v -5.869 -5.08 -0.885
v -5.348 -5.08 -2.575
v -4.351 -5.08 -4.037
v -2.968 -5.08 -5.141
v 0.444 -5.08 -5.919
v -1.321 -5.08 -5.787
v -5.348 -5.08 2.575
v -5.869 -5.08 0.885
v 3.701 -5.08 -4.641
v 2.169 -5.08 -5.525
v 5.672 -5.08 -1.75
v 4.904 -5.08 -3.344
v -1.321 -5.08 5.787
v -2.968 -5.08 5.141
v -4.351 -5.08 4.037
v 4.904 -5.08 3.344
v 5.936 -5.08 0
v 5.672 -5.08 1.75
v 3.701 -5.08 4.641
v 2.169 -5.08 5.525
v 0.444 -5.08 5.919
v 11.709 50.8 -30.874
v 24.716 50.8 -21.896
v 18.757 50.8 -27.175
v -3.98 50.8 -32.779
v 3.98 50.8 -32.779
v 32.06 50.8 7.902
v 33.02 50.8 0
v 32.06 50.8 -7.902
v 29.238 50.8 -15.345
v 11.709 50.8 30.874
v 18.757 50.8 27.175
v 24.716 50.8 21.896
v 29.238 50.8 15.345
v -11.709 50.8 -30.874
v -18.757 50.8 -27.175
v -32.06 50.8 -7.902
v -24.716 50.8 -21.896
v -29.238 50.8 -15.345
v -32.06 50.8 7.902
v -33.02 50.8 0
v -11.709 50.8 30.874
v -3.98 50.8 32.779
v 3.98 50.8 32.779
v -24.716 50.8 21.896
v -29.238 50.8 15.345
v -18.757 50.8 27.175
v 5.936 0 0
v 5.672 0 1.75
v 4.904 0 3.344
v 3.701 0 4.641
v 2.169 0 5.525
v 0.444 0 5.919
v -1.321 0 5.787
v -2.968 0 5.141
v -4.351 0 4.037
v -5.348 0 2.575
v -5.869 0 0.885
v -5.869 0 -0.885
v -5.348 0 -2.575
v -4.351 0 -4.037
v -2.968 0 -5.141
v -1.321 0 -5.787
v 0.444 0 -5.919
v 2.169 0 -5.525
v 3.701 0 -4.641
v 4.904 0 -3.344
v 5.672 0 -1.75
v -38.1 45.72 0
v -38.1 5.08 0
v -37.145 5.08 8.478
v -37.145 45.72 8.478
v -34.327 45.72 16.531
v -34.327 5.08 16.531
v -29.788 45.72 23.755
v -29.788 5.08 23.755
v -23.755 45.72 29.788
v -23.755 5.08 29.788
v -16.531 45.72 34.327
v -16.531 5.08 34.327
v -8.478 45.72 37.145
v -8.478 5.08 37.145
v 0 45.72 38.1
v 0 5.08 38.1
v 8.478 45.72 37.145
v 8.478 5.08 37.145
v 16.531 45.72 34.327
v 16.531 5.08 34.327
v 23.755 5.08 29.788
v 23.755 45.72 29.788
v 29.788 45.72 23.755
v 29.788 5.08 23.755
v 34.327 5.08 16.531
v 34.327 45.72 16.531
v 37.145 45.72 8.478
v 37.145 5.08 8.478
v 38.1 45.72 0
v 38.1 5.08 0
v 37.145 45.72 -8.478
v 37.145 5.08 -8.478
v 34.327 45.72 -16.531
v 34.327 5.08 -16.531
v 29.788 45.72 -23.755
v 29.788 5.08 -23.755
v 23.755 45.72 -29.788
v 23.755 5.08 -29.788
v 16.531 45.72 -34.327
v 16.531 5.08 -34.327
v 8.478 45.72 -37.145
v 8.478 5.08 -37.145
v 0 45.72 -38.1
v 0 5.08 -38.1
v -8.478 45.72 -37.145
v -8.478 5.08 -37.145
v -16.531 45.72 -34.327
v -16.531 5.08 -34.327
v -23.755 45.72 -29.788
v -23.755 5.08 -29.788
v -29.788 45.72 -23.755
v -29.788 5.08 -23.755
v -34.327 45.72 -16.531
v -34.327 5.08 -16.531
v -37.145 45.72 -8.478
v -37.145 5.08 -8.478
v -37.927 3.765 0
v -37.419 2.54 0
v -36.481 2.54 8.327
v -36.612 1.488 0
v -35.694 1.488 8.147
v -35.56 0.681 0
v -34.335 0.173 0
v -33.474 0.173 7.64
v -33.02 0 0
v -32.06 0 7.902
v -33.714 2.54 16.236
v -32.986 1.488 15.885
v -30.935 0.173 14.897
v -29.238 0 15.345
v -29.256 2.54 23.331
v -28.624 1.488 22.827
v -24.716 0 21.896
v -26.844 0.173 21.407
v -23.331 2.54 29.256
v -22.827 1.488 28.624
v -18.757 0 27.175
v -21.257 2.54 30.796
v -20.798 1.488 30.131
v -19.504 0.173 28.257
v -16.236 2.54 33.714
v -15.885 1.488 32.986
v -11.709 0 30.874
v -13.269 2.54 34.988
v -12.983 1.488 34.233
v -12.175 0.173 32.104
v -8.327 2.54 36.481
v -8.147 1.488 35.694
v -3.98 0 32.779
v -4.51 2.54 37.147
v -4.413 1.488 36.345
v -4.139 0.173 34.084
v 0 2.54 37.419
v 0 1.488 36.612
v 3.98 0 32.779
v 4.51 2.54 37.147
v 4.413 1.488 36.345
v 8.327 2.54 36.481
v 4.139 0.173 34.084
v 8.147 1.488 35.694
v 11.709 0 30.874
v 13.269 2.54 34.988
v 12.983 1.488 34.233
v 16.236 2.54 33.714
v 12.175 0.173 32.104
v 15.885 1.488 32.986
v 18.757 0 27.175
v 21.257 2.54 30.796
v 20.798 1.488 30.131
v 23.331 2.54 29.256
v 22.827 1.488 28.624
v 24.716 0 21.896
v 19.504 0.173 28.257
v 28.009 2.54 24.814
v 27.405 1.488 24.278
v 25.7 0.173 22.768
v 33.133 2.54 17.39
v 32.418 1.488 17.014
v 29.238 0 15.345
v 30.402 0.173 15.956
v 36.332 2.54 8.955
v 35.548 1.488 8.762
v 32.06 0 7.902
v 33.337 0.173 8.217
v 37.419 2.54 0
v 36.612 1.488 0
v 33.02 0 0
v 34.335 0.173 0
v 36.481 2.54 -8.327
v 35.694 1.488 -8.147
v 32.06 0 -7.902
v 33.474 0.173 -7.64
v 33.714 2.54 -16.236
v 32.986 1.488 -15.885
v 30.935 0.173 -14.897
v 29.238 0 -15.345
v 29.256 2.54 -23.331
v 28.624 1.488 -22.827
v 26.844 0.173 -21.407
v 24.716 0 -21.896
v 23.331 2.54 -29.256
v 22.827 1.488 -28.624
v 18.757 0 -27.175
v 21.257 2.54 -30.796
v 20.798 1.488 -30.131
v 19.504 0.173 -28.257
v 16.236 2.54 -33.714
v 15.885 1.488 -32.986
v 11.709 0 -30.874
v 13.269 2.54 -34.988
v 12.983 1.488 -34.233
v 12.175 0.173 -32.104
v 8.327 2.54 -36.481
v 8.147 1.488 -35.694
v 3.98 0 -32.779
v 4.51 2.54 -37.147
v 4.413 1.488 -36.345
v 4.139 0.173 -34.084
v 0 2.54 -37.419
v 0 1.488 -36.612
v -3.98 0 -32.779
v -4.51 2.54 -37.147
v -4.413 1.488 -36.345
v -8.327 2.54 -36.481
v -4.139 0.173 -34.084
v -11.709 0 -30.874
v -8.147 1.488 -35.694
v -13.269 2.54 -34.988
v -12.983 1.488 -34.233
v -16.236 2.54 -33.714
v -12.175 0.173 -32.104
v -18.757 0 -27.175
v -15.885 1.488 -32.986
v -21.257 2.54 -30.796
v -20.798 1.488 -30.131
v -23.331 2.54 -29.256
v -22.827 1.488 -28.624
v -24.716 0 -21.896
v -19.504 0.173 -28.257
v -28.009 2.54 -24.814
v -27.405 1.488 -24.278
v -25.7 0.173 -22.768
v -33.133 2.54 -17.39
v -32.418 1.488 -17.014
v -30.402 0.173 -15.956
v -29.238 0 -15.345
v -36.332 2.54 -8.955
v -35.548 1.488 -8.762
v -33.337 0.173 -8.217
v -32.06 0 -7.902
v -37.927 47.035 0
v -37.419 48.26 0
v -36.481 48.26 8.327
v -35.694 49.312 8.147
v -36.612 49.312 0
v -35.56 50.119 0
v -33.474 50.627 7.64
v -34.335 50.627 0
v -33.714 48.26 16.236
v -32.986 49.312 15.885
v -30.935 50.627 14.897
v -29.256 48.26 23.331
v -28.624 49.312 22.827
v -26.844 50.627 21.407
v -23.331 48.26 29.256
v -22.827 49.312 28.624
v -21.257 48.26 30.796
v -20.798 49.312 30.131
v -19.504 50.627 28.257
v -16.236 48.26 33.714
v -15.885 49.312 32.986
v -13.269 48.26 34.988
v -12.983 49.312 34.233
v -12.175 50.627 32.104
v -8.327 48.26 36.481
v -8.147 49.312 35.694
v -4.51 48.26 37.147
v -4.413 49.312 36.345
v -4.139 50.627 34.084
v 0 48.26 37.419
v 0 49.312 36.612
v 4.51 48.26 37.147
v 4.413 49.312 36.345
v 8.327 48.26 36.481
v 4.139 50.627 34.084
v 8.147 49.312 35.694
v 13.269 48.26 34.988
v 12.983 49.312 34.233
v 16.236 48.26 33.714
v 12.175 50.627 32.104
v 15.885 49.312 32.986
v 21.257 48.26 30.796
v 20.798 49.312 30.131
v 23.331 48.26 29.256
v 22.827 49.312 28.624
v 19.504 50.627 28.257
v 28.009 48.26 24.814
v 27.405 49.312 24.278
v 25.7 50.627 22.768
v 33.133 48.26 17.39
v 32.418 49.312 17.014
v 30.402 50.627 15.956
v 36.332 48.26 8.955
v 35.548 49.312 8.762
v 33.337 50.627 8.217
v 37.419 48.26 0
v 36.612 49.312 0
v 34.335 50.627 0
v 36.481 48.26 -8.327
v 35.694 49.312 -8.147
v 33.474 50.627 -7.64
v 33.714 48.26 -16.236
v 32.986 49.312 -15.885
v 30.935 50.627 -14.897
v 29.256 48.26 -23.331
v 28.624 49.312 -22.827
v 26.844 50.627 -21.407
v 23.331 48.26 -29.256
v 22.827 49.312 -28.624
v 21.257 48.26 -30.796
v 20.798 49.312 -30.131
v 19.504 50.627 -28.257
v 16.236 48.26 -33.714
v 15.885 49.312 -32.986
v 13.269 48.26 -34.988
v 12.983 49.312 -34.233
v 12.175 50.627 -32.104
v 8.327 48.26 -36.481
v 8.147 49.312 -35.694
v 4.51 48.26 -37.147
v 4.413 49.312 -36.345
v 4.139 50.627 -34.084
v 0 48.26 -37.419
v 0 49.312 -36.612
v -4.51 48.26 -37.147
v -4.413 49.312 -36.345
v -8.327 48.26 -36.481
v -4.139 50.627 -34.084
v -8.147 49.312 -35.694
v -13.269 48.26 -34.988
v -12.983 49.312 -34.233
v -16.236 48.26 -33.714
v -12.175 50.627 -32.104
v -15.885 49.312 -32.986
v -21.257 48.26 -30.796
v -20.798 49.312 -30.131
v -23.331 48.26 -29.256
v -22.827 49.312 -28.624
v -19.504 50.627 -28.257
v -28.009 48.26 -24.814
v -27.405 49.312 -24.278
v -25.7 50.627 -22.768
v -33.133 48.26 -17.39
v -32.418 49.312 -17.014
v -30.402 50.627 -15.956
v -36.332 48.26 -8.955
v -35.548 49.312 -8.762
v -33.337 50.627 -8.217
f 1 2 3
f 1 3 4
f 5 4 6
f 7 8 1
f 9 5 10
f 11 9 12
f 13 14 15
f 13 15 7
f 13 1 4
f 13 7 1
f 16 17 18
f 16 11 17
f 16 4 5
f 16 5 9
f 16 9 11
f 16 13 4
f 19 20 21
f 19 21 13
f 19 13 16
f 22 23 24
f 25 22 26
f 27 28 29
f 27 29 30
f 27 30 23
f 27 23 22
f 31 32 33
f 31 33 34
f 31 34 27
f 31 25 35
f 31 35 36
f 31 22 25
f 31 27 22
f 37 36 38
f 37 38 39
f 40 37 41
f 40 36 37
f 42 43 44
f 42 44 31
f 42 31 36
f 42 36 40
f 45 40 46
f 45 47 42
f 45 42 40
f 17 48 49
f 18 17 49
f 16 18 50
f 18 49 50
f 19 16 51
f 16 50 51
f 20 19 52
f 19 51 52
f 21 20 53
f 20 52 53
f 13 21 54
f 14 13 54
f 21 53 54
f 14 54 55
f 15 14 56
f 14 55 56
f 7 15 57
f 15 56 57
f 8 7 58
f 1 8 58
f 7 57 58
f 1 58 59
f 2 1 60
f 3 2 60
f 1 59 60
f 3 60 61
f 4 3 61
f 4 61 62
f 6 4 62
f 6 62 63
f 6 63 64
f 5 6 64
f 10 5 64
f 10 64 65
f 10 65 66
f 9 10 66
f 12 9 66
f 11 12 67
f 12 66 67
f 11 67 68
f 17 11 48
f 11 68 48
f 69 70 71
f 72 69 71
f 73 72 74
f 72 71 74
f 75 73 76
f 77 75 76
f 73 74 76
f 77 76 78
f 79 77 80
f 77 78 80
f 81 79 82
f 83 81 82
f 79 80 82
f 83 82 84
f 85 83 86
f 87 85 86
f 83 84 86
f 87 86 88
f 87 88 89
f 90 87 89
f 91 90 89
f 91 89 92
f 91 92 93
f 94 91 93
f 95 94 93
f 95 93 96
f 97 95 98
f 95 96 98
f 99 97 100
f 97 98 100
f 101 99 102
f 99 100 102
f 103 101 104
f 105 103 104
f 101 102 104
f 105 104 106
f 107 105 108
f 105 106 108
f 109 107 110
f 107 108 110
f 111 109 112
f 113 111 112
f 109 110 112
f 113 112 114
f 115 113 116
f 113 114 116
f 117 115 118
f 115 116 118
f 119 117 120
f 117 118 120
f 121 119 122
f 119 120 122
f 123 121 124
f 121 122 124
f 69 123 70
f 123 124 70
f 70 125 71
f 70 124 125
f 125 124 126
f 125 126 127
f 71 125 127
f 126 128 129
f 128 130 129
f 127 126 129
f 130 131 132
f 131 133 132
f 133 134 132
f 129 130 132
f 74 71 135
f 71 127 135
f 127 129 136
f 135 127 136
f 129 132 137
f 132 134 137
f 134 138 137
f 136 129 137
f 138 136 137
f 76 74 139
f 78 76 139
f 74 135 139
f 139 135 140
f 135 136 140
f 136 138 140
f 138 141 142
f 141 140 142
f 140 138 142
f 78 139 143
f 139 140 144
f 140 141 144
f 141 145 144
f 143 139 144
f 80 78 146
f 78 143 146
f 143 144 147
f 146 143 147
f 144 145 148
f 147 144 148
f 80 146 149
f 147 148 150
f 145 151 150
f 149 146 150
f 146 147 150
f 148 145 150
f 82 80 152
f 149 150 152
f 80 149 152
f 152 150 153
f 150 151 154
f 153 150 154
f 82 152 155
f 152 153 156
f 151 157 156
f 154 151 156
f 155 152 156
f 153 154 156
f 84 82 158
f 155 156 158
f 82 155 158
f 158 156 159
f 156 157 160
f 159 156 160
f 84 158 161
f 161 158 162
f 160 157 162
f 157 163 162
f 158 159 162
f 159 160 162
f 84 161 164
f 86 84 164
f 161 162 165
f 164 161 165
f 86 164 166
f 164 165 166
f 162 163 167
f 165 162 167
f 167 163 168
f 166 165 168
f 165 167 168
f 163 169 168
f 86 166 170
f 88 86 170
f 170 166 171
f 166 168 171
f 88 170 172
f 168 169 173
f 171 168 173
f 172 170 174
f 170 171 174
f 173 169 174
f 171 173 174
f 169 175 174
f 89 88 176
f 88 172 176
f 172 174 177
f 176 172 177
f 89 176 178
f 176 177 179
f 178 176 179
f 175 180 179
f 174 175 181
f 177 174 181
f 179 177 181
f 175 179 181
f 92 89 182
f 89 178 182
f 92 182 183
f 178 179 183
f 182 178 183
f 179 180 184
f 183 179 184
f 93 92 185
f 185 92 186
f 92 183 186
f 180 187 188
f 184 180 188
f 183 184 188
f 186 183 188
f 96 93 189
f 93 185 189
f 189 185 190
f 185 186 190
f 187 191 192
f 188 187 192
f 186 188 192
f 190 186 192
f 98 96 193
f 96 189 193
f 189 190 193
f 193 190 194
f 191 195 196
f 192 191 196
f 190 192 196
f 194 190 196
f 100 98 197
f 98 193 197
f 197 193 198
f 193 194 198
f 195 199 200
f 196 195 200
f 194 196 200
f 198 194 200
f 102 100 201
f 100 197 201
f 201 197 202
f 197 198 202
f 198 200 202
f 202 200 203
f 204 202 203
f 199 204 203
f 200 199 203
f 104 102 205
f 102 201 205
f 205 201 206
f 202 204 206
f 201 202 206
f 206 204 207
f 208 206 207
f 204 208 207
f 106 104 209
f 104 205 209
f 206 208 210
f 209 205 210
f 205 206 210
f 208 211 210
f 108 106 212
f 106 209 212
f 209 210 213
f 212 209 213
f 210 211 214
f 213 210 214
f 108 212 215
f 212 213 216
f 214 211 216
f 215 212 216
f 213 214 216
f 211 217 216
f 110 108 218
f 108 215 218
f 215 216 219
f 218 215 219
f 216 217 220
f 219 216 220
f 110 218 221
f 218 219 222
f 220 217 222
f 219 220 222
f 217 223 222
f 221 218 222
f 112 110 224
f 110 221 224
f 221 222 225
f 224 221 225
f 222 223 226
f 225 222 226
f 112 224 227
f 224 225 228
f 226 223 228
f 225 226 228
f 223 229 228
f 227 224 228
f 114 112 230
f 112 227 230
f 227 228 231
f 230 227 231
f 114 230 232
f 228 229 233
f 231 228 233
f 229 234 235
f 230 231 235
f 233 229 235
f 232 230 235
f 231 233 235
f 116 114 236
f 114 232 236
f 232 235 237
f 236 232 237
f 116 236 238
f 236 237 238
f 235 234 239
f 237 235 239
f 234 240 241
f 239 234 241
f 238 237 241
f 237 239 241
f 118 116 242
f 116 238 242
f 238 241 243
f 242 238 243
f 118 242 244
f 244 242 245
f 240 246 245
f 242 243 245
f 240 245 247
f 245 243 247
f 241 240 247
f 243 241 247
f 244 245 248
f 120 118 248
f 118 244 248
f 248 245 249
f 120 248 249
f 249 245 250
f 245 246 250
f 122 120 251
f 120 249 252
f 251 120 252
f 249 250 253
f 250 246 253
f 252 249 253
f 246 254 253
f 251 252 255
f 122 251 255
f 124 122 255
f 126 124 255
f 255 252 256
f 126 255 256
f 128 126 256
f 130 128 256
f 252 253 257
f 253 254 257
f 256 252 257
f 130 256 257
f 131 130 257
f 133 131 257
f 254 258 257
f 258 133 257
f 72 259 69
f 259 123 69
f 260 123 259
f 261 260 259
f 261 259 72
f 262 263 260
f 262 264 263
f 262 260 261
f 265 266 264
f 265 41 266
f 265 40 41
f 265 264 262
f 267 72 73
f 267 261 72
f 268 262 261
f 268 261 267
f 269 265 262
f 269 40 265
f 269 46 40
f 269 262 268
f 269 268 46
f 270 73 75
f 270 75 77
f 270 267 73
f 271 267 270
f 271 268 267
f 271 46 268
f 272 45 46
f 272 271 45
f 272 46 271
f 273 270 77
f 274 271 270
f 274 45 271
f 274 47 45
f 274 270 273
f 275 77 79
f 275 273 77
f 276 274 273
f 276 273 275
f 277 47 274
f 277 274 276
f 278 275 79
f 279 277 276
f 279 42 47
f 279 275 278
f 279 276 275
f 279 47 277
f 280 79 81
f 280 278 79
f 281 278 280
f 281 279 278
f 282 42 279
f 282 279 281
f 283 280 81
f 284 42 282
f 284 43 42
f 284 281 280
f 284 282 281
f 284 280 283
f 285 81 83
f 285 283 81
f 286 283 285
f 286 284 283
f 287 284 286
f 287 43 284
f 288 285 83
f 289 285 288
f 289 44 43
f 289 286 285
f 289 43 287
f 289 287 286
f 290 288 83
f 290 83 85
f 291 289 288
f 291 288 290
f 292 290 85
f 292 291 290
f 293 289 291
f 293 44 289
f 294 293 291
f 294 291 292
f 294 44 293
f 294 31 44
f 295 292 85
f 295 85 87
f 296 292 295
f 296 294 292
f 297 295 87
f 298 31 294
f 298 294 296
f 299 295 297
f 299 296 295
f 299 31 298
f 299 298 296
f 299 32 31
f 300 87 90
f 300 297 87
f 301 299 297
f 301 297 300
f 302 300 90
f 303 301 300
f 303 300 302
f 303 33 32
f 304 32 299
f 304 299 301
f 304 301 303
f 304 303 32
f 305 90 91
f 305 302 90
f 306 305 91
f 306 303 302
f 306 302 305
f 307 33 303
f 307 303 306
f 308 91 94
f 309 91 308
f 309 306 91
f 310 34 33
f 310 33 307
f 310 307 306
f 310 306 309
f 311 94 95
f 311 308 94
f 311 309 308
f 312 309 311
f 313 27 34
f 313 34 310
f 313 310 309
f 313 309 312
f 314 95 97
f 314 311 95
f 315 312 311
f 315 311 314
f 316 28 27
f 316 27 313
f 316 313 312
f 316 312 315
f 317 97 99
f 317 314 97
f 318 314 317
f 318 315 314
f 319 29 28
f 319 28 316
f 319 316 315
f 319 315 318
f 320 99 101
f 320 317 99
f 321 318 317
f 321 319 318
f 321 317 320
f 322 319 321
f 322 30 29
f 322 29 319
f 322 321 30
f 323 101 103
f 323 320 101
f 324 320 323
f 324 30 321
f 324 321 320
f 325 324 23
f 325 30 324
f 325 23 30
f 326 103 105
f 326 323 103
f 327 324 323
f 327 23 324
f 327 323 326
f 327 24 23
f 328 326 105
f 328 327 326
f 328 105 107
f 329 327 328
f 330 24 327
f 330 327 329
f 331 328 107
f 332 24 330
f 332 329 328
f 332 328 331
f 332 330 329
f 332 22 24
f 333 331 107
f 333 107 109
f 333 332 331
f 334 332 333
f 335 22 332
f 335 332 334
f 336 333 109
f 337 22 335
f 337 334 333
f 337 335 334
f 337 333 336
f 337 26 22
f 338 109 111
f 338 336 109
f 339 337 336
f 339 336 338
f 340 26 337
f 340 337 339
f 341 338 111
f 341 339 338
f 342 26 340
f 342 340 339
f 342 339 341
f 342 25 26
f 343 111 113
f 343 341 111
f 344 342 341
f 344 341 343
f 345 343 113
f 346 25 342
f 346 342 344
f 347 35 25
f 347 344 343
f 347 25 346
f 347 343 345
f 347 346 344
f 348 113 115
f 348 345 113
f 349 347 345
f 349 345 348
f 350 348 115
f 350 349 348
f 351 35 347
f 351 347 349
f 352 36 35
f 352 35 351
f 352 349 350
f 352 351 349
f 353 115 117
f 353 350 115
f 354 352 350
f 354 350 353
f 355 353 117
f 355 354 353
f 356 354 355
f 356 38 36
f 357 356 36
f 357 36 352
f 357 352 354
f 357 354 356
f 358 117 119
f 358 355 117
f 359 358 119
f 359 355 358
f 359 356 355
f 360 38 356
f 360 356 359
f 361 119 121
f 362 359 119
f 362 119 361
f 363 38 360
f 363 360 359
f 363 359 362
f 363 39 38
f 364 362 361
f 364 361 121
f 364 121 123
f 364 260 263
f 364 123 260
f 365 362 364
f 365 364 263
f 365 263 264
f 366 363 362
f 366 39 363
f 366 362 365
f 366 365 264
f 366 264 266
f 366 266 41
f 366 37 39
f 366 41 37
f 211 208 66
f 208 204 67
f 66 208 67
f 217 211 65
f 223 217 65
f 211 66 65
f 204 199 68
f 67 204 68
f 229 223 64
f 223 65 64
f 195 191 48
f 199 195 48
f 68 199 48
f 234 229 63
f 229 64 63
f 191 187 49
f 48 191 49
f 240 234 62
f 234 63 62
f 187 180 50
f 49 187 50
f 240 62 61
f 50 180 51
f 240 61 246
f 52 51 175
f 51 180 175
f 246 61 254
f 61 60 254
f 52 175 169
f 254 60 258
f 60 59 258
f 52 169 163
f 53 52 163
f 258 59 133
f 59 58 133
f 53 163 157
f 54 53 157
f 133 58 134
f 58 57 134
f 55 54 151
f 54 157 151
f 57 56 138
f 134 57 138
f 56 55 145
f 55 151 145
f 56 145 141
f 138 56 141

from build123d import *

# Parameters (mm, degrees)
F0_R     = 5.935781
F1_DEPTH = 5.08
F2_R     = 38.1
F3_DEPTH = 50.8
F4_R     = 5.08


with BuildPart() as f1:
    # F0 (on Front) → F1 (new body)
    with BuildSketch(Plane.XZ):
        Circle(F0_R)
    extrude(amount=F1_DEPTH)

    # F2 (on face) → F3 (join)
    with BuildSketch(Plane(origin=(0, 0, 0), x_dir=(-1, 0, 0), z_dir=(0, 1, 0))):
        Circle(F2_R)
    extrude(amount=F3_DEPTH)

    # F4
    f4_edges = [f1.edges().sort_by_distance(p)[0] for p in [
        (38.1, 0, 0),
        (38.1, 50.8, 0),
    ]]
    fillet(f4_edges, radius=F4_R)


solid = f1.part
